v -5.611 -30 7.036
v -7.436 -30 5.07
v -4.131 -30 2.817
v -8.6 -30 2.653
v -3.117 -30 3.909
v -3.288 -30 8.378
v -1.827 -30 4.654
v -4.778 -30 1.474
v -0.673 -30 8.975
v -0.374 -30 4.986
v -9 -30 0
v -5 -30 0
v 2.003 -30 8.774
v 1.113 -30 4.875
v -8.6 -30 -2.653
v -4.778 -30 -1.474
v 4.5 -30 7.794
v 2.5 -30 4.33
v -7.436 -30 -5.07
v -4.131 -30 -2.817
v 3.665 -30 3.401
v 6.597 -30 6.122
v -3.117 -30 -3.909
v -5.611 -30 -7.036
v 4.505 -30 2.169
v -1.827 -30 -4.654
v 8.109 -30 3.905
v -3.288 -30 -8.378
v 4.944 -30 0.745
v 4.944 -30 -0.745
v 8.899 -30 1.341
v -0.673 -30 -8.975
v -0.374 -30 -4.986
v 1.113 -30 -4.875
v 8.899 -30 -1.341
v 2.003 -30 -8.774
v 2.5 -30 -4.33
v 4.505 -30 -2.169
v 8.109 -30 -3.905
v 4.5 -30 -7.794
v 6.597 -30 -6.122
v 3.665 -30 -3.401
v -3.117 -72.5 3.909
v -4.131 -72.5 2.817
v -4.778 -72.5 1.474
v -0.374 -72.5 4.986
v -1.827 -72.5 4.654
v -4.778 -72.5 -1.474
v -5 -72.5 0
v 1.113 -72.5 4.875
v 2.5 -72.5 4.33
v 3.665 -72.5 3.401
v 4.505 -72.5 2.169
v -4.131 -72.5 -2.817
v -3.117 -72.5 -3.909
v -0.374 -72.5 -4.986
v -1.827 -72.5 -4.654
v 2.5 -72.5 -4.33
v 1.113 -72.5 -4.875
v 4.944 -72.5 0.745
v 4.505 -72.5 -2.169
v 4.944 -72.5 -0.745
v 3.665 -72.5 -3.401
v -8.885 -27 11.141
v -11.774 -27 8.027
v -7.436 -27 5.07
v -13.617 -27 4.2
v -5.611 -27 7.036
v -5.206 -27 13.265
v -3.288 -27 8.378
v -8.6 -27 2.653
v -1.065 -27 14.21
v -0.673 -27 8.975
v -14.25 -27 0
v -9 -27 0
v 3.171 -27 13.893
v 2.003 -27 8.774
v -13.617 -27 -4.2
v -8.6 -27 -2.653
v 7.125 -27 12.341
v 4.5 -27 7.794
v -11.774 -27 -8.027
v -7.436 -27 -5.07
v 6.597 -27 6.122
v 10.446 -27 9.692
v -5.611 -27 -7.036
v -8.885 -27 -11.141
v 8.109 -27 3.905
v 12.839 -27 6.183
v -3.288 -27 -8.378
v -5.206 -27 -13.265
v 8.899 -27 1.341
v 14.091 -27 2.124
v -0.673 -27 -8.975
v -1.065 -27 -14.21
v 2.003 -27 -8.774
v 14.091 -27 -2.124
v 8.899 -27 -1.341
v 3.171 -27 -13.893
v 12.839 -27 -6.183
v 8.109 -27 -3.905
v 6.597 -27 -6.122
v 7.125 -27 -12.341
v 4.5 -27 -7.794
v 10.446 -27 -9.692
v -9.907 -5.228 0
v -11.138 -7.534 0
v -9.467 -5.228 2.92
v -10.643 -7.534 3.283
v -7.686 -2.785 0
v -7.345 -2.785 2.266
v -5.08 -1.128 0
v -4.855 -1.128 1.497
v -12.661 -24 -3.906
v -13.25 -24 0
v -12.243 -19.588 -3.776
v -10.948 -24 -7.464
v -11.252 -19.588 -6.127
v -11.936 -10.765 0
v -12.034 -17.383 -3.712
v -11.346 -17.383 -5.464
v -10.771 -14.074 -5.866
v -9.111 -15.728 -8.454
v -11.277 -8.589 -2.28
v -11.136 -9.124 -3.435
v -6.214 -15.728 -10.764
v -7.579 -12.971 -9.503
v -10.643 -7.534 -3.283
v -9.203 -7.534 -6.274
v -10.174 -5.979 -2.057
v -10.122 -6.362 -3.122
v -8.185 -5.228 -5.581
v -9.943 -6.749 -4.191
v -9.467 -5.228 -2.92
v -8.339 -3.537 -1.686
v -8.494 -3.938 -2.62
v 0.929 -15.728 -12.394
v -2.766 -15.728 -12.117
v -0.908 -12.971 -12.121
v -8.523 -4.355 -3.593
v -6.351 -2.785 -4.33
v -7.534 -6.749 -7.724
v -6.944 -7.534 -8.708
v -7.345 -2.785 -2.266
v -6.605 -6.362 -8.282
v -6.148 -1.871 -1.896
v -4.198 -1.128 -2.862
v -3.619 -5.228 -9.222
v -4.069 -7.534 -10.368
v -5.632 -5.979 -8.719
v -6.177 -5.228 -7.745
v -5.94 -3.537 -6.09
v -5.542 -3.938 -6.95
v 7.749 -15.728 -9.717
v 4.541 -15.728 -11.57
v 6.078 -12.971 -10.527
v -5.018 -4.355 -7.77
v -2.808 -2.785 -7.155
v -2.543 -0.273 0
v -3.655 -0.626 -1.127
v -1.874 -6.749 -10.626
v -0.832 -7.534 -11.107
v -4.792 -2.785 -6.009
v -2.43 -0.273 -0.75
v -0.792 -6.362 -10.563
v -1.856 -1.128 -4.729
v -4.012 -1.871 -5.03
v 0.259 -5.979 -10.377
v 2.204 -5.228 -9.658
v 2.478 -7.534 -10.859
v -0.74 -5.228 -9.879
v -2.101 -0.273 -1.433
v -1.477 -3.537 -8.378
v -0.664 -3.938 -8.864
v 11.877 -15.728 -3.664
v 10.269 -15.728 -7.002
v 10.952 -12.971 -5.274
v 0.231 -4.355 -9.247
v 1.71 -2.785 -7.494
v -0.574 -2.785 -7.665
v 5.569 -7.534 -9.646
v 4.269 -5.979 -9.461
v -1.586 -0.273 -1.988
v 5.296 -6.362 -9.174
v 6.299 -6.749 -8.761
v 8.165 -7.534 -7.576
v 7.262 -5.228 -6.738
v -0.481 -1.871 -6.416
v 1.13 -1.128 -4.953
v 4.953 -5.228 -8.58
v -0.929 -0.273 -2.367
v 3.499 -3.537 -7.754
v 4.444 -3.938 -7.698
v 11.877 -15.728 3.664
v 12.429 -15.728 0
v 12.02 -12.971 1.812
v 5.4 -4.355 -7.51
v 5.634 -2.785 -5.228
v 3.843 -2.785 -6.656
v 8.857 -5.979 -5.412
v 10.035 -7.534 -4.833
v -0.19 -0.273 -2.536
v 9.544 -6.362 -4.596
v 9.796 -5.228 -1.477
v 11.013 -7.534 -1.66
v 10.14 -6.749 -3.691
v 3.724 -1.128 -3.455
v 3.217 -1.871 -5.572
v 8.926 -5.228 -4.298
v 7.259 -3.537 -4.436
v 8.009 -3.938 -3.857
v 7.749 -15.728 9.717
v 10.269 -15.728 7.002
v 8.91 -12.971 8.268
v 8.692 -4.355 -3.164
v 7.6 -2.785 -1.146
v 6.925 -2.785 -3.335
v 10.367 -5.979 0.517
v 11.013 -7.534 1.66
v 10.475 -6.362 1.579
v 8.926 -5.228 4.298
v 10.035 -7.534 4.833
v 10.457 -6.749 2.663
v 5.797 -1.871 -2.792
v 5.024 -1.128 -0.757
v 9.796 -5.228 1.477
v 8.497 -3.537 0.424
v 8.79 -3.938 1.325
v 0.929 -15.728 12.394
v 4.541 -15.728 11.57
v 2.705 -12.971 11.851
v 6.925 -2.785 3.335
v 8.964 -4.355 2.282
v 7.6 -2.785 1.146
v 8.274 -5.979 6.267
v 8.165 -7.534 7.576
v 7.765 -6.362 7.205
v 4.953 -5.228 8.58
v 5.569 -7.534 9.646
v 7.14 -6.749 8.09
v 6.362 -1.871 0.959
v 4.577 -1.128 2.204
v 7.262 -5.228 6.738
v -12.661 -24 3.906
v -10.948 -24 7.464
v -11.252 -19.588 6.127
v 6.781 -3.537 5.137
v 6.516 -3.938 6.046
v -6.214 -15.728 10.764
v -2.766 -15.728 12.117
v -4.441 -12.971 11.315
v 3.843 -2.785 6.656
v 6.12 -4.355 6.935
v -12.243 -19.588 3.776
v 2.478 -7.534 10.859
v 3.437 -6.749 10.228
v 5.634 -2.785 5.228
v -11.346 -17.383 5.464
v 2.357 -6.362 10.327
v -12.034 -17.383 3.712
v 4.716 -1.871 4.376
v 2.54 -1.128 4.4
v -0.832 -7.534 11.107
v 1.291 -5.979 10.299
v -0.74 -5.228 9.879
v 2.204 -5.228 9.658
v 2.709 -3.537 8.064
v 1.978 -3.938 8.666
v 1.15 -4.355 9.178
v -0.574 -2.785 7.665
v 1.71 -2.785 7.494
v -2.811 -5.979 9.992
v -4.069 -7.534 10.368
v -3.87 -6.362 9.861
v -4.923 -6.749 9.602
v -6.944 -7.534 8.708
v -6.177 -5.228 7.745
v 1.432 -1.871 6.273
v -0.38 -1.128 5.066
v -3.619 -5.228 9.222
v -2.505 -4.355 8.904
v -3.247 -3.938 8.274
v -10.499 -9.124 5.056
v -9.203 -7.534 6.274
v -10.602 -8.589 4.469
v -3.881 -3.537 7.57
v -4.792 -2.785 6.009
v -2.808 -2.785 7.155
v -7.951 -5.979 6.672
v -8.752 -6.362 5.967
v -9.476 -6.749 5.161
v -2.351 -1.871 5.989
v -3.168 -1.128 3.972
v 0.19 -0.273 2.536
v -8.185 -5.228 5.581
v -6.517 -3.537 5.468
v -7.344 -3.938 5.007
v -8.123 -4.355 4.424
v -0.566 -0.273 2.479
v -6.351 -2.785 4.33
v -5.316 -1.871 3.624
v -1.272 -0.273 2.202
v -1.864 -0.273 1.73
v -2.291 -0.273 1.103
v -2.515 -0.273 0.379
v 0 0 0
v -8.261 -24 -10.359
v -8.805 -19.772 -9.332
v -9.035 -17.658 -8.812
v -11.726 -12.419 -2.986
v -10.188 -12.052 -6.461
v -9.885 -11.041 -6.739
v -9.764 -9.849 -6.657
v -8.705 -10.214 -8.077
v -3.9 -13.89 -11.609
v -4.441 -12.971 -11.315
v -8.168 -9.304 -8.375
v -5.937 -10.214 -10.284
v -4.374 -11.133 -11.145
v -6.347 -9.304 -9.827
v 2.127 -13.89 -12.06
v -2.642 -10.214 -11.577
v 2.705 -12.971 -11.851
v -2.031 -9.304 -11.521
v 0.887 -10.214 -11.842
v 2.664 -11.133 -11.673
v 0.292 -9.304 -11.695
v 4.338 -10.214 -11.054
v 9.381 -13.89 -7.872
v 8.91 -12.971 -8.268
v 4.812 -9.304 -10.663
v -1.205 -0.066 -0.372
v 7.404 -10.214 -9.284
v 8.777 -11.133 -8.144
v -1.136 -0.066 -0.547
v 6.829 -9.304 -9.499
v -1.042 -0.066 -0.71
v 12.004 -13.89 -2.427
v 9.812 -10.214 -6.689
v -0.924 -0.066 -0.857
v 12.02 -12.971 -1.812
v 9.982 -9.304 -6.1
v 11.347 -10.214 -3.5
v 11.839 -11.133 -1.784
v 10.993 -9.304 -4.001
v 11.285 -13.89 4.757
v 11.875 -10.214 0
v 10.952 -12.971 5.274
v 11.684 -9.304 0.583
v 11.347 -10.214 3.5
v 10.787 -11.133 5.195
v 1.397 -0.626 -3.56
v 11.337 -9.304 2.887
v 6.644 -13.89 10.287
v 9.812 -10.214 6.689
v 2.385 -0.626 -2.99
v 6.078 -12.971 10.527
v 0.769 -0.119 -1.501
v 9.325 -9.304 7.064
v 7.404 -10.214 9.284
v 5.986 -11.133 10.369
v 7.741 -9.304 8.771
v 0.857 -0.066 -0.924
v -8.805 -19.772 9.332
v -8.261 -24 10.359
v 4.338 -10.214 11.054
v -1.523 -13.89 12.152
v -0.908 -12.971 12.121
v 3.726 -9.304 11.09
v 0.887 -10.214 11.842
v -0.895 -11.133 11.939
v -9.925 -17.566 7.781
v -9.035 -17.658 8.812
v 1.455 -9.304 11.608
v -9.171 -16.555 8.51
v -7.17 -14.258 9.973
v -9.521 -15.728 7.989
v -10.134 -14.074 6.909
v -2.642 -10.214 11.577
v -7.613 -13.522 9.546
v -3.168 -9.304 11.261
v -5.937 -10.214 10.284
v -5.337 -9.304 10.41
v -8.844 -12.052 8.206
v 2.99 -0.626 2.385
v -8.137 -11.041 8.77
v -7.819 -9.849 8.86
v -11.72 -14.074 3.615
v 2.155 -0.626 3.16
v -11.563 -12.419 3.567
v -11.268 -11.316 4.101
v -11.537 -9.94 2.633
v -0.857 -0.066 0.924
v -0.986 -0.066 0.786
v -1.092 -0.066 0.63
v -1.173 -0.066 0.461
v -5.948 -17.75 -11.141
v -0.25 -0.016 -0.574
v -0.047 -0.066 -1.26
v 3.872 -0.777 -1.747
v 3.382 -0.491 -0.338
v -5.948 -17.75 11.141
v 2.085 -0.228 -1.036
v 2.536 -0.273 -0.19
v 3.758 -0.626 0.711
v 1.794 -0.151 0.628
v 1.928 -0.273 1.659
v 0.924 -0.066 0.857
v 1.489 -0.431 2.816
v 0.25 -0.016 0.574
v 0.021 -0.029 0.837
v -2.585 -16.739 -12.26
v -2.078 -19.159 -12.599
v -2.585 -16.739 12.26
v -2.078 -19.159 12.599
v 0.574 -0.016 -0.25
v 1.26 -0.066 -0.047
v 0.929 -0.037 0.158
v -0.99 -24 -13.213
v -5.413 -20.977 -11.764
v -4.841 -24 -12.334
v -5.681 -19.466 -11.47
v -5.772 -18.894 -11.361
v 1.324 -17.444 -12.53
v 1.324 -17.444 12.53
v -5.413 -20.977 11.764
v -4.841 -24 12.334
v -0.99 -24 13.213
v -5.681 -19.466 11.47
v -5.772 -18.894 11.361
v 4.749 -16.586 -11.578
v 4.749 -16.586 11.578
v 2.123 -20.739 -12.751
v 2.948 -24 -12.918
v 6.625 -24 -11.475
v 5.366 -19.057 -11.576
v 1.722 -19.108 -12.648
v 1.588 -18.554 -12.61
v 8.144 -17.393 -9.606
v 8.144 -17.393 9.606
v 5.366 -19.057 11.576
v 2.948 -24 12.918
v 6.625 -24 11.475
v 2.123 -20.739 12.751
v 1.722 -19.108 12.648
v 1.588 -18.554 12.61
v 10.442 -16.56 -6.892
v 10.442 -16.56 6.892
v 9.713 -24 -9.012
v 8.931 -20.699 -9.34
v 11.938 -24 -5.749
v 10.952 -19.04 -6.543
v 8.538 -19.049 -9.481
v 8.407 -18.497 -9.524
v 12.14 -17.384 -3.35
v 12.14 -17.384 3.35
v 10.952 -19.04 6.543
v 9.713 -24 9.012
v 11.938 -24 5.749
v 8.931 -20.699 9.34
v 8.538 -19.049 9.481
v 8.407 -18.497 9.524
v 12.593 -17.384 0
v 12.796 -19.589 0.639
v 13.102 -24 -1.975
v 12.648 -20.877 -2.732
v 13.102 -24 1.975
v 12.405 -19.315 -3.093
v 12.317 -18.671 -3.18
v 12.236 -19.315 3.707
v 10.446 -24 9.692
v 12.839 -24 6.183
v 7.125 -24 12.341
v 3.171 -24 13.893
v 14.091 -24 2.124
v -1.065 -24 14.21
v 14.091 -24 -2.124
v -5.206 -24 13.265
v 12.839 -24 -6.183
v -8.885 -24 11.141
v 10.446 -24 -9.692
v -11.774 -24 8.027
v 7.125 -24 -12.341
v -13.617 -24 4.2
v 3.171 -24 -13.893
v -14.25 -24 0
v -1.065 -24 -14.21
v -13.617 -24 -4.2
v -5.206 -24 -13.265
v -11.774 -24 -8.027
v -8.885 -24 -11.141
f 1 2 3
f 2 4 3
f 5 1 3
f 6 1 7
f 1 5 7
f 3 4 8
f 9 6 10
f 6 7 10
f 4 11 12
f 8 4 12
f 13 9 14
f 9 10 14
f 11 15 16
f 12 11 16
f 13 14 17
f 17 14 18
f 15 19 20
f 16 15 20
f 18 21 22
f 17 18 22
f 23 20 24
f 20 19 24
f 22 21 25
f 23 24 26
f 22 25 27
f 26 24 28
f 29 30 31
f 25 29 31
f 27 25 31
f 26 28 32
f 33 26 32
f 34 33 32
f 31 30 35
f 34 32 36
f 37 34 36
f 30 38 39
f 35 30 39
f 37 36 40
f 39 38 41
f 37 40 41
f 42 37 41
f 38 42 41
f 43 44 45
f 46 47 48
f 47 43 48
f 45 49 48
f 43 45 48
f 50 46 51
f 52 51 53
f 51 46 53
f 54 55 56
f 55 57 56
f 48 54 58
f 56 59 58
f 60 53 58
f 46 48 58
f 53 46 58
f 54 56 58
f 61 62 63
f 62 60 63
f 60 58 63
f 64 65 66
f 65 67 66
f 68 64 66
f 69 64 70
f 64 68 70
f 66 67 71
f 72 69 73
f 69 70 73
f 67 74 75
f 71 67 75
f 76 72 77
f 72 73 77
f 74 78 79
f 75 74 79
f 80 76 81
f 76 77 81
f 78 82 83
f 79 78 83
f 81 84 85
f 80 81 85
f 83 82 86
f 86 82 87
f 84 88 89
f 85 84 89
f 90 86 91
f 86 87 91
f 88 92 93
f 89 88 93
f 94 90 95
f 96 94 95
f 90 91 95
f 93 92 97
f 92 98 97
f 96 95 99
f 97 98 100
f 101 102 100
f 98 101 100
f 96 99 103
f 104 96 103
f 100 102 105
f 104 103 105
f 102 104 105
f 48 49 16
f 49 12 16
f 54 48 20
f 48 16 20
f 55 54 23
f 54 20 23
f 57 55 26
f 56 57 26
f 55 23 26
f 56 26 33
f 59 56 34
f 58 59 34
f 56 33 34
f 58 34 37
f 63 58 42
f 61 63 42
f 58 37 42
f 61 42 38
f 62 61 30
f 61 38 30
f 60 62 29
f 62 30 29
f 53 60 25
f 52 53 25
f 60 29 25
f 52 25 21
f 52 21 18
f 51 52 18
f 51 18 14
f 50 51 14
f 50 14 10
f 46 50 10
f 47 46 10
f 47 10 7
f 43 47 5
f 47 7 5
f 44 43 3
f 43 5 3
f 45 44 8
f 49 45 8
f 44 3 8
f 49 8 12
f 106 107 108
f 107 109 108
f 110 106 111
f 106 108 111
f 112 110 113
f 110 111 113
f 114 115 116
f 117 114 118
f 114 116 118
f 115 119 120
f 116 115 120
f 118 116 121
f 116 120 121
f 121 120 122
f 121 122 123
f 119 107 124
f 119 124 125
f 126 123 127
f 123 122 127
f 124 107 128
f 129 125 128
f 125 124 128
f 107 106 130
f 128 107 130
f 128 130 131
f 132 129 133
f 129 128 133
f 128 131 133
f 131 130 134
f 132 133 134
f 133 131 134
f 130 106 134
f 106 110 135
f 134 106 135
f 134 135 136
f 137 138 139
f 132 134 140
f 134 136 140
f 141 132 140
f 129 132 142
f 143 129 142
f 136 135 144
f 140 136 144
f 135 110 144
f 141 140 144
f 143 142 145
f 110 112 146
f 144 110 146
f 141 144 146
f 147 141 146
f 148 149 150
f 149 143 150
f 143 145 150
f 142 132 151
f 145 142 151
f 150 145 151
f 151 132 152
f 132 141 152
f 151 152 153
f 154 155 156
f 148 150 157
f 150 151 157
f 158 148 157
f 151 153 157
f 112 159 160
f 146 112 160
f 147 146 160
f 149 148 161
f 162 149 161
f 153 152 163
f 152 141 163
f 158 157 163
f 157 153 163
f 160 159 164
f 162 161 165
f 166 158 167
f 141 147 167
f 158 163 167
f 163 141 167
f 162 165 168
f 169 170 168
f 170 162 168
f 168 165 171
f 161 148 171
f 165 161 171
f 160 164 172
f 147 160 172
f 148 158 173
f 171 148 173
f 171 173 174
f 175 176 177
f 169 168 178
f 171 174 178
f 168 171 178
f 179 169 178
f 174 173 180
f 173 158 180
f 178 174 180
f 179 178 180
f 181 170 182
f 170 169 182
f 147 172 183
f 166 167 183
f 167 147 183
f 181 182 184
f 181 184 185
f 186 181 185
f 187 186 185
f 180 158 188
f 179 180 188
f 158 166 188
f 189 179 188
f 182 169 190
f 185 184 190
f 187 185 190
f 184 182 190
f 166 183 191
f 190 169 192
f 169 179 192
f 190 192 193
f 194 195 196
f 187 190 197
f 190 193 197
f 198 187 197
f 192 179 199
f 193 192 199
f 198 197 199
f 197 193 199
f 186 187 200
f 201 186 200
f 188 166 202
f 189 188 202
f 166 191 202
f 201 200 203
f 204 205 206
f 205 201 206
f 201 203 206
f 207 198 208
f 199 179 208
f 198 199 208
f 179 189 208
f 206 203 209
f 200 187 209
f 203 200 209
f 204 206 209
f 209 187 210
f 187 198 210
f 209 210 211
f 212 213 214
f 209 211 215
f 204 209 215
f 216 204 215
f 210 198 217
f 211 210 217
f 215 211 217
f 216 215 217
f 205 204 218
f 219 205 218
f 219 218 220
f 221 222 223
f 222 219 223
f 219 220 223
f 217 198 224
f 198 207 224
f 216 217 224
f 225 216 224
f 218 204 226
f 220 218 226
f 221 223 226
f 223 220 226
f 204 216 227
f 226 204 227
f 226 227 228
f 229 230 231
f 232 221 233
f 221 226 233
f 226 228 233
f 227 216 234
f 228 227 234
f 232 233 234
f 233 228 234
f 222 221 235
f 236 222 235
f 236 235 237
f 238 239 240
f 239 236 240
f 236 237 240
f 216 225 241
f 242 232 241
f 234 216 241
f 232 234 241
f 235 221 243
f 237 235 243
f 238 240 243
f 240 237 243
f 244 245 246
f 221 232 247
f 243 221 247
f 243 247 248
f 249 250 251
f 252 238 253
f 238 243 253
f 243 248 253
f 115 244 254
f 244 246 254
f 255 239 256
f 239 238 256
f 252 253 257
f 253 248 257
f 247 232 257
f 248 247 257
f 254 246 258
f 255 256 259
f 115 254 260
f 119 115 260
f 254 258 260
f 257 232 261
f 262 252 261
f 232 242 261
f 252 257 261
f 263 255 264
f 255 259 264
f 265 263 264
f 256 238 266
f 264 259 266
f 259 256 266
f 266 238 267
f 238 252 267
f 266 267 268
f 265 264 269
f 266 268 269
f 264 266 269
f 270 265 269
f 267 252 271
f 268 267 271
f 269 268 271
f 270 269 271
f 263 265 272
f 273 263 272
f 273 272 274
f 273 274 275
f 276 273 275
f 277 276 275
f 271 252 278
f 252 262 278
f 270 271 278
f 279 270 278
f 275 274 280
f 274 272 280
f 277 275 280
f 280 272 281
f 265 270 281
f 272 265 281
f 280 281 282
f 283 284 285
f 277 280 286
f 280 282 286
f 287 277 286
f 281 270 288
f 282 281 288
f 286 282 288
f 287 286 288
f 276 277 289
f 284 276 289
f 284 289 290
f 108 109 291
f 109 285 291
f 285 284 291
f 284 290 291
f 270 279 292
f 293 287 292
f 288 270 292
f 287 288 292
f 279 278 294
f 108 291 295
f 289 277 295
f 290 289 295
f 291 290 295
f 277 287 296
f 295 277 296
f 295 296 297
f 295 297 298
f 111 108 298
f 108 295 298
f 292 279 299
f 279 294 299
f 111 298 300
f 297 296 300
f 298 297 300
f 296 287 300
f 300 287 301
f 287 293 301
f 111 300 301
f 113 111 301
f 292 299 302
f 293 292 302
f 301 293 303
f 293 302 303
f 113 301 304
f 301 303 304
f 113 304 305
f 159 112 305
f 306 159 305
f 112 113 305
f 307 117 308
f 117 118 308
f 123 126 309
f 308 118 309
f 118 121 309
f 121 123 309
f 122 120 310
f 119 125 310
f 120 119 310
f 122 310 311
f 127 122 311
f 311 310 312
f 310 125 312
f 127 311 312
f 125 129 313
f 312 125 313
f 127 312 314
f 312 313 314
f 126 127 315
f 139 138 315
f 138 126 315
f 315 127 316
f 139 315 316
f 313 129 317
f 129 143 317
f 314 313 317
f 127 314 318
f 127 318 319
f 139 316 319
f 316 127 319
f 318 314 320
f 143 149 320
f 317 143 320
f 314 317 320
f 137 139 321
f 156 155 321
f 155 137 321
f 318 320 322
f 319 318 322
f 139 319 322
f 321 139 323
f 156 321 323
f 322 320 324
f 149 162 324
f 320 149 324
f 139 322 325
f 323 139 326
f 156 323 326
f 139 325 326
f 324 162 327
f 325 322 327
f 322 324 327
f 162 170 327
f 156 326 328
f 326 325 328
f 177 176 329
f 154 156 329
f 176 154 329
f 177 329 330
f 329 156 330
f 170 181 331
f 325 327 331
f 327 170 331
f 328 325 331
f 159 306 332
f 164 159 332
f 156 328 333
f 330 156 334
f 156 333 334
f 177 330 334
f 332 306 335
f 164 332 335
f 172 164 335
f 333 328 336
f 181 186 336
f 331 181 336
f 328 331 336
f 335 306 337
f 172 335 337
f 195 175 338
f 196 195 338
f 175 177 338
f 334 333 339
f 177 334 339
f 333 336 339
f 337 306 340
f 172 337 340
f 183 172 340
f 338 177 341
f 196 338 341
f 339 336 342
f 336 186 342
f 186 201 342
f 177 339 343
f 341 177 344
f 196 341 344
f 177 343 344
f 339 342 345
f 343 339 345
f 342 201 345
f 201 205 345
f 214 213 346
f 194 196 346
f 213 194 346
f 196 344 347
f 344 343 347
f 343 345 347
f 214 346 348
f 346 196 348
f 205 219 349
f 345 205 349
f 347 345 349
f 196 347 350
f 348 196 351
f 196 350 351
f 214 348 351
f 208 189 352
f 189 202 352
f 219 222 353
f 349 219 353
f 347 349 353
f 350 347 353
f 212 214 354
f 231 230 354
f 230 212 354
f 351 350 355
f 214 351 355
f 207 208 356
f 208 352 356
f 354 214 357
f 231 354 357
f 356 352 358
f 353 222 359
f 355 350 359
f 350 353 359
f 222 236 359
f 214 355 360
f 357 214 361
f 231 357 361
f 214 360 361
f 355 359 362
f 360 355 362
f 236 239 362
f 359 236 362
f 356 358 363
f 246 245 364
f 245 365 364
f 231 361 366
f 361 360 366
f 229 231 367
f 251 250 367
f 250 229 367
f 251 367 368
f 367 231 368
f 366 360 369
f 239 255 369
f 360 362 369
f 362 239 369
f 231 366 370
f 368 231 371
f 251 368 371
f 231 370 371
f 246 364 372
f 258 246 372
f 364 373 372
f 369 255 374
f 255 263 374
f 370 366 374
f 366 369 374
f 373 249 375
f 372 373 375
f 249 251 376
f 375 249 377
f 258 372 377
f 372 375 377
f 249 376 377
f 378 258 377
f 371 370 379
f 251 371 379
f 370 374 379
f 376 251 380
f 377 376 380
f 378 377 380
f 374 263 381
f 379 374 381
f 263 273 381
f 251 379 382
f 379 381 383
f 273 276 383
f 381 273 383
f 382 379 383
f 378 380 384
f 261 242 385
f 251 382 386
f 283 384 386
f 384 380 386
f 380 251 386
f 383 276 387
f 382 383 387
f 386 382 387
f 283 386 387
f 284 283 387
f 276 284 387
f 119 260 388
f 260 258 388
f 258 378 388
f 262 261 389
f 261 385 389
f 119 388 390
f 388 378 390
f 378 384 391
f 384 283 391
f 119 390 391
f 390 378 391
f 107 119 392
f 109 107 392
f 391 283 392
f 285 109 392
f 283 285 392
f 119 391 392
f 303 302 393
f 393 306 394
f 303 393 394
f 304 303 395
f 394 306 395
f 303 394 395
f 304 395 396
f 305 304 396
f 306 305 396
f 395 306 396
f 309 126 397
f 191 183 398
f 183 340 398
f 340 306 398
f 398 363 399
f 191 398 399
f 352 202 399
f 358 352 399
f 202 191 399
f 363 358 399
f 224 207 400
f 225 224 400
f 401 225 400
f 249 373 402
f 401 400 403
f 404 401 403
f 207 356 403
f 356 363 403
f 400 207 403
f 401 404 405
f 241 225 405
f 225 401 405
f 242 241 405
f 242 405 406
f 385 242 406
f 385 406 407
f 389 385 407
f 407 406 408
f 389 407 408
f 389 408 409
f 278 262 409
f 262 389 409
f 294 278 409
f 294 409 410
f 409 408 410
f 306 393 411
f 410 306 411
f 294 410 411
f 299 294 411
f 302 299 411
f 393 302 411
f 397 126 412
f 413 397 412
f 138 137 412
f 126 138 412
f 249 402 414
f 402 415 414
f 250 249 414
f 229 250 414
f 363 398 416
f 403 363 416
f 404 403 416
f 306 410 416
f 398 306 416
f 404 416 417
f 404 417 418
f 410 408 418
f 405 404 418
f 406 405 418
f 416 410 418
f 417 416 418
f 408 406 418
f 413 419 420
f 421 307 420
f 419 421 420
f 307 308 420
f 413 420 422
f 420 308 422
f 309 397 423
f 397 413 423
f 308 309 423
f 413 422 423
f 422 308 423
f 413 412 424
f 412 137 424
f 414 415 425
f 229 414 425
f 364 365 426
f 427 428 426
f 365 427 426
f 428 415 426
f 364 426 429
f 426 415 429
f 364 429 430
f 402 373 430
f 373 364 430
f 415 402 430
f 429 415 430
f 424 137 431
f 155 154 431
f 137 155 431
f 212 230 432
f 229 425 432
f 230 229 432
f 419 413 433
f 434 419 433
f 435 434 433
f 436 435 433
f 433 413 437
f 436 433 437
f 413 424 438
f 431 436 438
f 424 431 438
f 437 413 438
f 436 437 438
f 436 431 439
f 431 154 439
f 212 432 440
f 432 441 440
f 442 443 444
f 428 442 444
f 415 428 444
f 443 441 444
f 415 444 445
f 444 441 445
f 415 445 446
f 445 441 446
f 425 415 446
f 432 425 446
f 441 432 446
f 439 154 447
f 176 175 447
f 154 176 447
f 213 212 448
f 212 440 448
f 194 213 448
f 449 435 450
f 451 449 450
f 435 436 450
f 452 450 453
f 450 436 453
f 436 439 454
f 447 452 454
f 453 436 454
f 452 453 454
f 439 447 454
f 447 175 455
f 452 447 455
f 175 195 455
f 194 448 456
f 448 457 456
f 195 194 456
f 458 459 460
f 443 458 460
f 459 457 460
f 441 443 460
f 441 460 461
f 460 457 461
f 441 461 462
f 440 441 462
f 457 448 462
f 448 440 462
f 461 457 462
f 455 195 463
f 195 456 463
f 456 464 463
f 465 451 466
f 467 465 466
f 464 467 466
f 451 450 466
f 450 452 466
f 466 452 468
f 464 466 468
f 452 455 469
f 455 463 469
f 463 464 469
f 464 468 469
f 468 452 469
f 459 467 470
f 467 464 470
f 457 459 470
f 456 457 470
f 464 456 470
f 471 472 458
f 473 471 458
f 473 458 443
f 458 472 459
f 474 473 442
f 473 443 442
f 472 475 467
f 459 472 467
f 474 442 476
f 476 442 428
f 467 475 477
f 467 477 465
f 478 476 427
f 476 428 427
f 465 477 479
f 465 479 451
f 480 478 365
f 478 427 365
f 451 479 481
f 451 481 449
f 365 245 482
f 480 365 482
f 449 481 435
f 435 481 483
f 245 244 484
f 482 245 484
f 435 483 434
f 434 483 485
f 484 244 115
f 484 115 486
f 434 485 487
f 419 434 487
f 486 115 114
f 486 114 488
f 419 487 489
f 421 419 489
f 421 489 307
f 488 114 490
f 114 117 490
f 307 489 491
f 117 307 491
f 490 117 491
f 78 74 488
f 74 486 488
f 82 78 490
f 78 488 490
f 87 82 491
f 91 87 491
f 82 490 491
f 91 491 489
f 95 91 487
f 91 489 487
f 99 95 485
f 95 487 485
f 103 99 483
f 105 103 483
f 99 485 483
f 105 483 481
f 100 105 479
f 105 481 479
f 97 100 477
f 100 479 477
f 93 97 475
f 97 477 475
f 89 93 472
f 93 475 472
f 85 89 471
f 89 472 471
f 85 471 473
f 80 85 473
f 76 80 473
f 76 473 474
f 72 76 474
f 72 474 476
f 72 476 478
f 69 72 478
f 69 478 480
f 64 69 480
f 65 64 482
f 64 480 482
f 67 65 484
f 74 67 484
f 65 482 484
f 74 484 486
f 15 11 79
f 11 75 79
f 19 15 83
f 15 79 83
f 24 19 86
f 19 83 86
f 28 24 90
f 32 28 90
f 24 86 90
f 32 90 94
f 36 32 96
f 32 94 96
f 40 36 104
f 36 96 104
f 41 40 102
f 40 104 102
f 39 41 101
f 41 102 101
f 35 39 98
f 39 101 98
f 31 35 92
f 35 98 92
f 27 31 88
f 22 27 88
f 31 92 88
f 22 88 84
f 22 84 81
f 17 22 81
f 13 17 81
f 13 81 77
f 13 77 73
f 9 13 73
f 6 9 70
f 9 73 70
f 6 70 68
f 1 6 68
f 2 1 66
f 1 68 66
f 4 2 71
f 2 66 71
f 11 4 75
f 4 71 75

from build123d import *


with BuildPart() as part:
    # Sketch1 → Revolve1 (revolve)
    with BuildSketch(Plane.XY, mode=Mode.PRIVATE) as revolve1_sk:
        with BuildLine():
            Line((0, 0), (0, -72.5))
            Line((0, -72.5), (5, -72.5))
            Line((5, -72.5), (5, -30))
            Line((5, -30), (9, -30))
            Line((9, -30), (9, -27))
            Line((9, -27), (14.25, -27))
            Line((14.25, -27), (14.25, -24))
            Line((14.25, -24), (13.25, -24))
            add(Edge.make_bspline(
                [(13.25, -24), (12.876288893, -20.234768096), (12.502577786, -16.469536192), (12.12886668, -12.704304288), (12.10802883, -12.494357794), (12.06635313, -12.074464806), (12.003839581, -11.444625323), (11.962163881, -11.024732334), (11.941326032, -10.81478584), (11.913600396, -10.535443194), (11.858149124, -9.976757903), (11.666555139, -9.148985732), (11.514124842, -8.608285073), (11.428528654, -8.340938262), (9.779050122, -3.189040311), (5.409513095, 0), (0, 0)],
                knots=[0, 0, 0, 0, 0.379321245, 0.379321245, 0.379321245, 0.400471912, 0.421622579, 0.442773246, 0.442773246, 0.442773246, 0.470915098, 0.499056951, 0.527198803, 0.527198803, 0.527198803, 1, 1, 1, 1], degree=3, weights=[1, 1, 1, 1, 1, 1, 1, 1, 1, 1, 1, 1, 1, 1, 0.871833681, 0.871833681, 1]))
        make_face()
    revolve(revolve1_sk.sketch.rotate(Axis((0, 0, 0), (0, -1, 0)), 180), axis=Axis((0, 0, 0), (0, -1, 0)))


solid = part.part
